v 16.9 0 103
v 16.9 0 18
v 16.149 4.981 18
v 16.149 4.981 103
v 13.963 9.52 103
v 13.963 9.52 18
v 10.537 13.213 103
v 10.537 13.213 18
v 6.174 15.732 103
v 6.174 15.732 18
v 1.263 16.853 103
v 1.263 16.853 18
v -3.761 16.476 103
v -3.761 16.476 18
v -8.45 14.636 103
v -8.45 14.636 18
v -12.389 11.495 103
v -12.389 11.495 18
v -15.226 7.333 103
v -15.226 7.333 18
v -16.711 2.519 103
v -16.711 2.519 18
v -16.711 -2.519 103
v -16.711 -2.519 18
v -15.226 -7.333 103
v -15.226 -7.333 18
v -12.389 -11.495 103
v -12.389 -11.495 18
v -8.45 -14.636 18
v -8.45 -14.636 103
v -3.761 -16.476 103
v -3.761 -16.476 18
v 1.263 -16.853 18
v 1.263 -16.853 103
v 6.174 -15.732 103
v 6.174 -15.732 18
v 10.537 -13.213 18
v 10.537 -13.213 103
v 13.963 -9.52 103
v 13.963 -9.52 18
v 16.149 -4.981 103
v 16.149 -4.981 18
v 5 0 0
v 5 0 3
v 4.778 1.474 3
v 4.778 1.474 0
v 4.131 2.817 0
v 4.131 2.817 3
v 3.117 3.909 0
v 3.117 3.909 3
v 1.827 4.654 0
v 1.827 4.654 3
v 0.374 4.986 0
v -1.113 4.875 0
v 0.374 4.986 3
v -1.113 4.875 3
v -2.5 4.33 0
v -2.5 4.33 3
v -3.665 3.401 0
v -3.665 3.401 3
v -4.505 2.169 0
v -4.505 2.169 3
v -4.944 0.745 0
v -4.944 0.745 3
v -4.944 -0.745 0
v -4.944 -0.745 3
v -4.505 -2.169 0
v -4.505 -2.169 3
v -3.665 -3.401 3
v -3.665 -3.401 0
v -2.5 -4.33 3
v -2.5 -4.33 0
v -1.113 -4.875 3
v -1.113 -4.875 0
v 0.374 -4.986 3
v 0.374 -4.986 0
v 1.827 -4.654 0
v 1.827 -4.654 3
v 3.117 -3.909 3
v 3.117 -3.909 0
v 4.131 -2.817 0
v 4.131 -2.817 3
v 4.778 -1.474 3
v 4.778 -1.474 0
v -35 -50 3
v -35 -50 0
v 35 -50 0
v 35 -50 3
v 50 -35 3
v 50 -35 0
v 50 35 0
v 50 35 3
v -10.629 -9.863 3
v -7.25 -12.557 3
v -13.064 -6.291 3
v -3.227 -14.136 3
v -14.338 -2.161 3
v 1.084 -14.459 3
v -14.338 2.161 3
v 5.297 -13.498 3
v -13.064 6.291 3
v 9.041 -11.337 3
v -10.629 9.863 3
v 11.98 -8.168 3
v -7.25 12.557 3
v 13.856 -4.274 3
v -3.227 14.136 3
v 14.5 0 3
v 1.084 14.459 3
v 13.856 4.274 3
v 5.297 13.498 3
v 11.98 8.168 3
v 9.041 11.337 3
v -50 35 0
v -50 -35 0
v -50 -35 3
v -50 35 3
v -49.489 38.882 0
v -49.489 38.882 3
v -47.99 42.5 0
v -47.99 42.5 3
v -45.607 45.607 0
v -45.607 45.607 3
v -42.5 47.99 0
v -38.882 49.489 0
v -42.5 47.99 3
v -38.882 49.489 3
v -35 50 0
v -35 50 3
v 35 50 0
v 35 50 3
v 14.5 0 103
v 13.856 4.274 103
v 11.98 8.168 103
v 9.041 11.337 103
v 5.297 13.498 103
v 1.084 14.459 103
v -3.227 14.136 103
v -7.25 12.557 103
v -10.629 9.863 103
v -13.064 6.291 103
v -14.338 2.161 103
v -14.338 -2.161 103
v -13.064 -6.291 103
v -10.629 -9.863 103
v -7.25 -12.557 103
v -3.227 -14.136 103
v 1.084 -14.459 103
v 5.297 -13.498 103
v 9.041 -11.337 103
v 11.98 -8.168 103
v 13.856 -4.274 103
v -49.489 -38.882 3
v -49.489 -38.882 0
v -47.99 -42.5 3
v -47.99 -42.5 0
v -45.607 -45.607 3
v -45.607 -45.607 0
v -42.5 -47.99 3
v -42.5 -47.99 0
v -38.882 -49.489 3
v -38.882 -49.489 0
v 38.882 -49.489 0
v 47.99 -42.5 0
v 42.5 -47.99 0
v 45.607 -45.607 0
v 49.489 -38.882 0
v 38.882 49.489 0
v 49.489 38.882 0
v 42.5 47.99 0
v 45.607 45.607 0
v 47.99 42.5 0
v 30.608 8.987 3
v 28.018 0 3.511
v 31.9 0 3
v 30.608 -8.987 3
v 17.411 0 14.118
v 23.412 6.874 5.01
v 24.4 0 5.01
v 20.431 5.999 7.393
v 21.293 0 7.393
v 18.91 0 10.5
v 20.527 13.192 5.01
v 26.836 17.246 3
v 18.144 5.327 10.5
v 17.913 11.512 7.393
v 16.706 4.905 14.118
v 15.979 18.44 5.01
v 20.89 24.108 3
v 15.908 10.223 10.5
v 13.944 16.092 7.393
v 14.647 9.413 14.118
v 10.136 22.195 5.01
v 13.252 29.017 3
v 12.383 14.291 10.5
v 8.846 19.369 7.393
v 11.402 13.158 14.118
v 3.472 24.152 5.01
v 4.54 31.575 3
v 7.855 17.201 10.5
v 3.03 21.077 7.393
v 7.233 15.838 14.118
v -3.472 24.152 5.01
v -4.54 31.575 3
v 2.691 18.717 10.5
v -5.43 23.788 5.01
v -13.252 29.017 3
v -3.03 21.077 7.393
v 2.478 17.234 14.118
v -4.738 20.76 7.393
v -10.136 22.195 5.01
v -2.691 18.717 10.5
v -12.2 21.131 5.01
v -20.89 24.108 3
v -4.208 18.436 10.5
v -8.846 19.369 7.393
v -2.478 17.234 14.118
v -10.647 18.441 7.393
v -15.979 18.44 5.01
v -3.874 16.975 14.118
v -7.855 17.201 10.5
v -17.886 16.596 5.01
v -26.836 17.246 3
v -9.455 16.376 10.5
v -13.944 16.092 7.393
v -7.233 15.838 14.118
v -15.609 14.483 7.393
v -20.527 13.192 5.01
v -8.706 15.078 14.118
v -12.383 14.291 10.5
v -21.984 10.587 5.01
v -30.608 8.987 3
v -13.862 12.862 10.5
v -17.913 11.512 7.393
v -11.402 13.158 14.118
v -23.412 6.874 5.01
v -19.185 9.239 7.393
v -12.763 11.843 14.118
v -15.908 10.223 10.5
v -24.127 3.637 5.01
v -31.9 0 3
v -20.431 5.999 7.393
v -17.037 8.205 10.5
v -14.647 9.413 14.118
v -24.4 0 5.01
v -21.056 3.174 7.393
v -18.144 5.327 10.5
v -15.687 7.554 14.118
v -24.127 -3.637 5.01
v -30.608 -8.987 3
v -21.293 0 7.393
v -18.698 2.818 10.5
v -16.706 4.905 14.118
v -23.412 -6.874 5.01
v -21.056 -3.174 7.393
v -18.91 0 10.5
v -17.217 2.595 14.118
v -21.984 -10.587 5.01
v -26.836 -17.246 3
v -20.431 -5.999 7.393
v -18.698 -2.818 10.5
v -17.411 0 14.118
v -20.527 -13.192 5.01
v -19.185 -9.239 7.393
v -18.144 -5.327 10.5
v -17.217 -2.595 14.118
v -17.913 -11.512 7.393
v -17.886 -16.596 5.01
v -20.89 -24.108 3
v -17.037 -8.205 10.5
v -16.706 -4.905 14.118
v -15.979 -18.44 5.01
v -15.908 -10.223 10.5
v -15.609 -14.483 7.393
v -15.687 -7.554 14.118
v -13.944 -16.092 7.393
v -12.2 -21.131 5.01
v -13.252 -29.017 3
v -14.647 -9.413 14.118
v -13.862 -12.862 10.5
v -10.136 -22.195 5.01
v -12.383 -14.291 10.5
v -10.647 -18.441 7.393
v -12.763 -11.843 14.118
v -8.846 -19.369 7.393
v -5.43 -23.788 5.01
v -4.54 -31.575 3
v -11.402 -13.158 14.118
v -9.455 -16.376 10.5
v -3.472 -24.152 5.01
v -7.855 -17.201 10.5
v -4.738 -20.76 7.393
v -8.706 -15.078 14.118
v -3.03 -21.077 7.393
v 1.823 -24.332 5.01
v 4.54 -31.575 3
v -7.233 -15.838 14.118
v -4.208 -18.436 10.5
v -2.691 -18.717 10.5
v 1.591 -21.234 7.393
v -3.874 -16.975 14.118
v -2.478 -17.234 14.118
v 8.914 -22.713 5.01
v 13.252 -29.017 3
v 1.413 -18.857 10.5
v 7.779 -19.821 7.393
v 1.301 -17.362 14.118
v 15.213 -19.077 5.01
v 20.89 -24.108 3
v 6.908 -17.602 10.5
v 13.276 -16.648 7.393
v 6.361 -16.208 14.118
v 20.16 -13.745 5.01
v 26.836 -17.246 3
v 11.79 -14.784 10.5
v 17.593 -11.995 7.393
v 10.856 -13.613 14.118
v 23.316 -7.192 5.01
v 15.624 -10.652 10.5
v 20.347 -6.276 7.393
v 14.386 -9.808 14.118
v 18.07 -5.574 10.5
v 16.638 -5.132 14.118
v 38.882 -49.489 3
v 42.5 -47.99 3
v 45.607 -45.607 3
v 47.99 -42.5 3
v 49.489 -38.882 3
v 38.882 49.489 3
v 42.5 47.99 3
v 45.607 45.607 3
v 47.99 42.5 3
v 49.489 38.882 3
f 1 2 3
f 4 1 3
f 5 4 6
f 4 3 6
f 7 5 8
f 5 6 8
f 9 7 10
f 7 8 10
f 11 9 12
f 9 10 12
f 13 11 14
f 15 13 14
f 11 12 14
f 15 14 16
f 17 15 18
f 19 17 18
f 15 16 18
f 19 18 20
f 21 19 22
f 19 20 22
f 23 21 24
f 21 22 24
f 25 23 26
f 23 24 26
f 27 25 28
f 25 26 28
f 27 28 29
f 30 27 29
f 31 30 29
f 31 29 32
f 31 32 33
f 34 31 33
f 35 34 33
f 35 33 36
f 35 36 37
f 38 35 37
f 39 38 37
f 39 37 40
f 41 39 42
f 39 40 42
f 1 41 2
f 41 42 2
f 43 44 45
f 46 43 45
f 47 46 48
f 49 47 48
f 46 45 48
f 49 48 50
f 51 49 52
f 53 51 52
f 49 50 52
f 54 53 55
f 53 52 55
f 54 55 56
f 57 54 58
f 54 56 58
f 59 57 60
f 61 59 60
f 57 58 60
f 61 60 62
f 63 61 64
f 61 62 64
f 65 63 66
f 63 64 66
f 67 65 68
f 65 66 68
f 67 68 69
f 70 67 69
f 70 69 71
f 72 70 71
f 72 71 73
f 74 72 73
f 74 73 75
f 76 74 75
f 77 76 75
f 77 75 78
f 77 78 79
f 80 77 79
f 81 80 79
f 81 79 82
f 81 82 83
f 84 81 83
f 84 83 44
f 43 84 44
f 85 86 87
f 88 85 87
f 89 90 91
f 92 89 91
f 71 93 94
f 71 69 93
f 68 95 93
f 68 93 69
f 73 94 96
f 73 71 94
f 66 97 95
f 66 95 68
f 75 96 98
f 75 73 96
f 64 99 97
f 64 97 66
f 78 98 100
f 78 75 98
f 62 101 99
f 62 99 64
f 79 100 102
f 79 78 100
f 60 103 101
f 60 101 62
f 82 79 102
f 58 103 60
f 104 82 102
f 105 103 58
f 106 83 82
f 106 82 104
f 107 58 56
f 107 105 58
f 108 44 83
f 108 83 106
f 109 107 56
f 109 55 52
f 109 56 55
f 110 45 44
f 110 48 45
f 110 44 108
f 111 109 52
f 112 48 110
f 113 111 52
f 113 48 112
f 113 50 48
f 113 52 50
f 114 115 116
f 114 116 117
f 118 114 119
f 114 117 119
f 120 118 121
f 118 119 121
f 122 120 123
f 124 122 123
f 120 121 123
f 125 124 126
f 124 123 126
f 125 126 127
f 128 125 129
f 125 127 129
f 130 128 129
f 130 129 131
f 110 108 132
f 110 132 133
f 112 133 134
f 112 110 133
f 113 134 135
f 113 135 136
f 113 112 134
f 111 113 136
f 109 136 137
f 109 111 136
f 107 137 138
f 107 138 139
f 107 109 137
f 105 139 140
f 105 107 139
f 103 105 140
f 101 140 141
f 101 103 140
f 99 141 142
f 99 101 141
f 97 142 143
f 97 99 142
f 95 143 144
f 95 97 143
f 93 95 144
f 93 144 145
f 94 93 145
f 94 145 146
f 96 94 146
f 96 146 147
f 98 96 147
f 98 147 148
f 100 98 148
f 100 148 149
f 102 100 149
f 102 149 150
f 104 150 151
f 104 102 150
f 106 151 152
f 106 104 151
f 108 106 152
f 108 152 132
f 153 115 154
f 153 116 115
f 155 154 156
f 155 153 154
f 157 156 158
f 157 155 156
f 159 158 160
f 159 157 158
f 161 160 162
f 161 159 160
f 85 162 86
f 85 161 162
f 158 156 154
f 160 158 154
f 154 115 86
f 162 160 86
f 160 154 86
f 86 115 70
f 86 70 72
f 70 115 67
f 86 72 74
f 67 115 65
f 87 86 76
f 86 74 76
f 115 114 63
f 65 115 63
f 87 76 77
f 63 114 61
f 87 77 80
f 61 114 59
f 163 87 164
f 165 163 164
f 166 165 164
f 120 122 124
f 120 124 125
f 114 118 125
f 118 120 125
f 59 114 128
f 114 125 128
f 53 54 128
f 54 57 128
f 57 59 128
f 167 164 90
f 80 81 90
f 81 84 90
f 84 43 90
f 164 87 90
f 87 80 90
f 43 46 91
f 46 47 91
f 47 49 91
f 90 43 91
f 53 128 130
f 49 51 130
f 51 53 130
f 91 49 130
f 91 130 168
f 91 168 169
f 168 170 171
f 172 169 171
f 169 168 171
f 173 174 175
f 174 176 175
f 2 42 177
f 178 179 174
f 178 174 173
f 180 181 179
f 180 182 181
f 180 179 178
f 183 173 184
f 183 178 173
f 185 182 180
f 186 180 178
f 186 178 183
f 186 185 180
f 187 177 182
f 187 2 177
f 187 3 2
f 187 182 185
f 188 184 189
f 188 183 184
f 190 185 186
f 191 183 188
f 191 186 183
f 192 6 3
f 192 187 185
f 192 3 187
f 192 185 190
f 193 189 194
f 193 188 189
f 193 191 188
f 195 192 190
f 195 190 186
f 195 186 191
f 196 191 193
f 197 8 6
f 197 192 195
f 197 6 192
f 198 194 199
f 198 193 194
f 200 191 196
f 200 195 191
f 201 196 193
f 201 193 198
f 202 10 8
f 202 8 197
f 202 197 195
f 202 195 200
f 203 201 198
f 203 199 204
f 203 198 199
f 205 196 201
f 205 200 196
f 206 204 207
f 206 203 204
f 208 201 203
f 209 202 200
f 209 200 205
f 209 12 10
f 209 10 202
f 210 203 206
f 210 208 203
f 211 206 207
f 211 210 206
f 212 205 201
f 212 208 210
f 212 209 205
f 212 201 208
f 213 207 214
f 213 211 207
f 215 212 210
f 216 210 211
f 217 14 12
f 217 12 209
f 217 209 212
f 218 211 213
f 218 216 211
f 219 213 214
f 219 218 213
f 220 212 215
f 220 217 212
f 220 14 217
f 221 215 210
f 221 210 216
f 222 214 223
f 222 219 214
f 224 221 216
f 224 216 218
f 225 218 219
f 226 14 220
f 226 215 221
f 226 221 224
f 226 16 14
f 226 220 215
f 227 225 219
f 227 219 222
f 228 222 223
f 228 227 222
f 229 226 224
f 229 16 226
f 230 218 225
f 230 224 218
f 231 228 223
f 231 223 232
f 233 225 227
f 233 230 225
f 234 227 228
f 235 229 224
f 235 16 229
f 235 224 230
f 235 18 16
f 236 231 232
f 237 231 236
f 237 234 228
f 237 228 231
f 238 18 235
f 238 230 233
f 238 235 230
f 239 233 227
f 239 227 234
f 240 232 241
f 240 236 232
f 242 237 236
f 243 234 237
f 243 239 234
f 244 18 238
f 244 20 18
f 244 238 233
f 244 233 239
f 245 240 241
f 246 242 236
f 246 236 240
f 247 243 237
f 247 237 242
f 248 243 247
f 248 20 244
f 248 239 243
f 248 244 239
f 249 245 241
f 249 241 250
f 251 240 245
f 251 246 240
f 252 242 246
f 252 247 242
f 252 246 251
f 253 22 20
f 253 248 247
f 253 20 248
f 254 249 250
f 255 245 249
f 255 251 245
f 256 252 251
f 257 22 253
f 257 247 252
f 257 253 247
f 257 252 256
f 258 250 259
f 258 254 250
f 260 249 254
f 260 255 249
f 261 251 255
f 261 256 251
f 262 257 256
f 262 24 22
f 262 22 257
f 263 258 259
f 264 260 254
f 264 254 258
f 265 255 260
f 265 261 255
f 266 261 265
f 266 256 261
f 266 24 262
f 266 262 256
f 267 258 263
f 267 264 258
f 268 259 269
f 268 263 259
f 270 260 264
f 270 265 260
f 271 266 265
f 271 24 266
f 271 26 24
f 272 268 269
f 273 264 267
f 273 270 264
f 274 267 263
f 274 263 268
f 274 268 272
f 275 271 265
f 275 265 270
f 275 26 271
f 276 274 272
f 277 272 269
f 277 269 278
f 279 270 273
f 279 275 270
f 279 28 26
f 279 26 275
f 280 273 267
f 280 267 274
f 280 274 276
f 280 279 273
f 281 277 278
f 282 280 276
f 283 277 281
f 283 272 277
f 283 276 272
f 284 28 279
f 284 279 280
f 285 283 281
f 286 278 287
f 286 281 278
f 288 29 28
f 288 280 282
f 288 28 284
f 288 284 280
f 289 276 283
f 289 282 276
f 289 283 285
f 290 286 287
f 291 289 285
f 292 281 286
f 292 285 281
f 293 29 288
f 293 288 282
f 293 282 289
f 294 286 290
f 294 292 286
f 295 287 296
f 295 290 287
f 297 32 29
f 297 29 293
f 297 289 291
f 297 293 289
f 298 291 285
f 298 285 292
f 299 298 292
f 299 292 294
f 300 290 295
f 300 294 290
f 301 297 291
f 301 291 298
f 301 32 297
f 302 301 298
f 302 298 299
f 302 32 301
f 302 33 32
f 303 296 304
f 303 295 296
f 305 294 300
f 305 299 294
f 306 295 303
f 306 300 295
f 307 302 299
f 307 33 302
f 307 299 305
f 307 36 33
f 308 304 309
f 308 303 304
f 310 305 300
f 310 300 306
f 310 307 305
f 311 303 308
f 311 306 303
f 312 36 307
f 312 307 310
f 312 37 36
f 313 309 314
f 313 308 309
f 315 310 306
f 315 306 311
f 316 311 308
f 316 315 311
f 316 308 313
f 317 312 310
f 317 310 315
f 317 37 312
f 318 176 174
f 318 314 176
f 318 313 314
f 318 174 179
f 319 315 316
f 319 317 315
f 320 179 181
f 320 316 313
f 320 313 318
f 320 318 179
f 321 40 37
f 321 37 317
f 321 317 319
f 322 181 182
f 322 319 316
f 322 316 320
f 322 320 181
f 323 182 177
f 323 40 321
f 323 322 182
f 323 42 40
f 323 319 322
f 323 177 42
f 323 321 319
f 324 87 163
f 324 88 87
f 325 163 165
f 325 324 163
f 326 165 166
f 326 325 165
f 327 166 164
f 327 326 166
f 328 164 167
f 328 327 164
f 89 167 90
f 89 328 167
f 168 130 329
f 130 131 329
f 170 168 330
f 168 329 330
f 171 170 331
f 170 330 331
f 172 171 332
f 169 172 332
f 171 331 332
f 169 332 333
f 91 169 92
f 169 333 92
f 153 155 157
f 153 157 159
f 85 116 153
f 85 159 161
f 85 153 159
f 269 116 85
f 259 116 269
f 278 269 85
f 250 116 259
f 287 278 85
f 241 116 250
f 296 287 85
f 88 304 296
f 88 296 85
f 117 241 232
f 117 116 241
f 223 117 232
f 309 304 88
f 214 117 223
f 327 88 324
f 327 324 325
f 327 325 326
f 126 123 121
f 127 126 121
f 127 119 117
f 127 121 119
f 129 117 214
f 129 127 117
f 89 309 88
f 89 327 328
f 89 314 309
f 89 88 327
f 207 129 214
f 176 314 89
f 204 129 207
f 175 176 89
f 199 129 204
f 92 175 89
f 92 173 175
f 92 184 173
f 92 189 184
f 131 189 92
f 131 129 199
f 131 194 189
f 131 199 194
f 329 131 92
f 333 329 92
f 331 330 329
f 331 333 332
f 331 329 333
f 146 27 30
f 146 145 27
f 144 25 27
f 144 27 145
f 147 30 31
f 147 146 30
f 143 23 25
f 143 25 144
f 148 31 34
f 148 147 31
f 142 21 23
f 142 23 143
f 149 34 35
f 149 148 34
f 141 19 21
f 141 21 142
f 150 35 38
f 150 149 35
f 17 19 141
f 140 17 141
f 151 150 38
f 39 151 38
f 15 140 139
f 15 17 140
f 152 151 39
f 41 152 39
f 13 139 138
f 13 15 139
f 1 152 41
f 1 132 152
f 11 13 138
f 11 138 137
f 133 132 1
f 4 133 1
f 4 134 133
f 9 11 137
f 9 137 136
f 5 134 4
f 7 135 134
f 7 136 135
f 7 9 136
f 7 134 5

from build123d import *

# Parameters (mm, degrees)
F0_W     = 100
F0_H     = 100
F1_DEPTH = 3
F2_R     = 16.9
F2_R_2   = 14.5
F3_DEPTH = 100
F4_R     = 15
F5_R     = 5
F6_DEPTH = 25


with BuildPart() as f1:
    # F0 (on Top) → F1 (new body)
    with BuildSketch(Plane.XY):
        Rectangle(F0_W, F0_H)
    extrude(amount=F1_DEPTH)

    # F2 (on face) → F3 (join)
    with BuildSketch(Plane.XY.offset(3)):
        Circle(F2_R)
        Circle(F2_R_2, mode=Mode.SUBTRACT)
    extrude(amount=F3_DEPTH)

    # F4
    f4_edges = [f1.edges().sort_by_distance(p)[0] for p in [
        (-16.9, 0, 3),
        (50, -50, 1.5),
        (50, 50, 1.5),
        (-50, 50, 1.5),
        (-50, -50, 1.5),
    ]]
    fillet(f4_edges, radius=F4_R)

    # F5 (on face) → F6 (cut)
    with BuildSketch(Plane.XY.offset(3)):
        Circle(F5_R)
    extrude(amount=-F6_DEPTH, mode=Mode.SUBTRACT)


solid = f1.part
